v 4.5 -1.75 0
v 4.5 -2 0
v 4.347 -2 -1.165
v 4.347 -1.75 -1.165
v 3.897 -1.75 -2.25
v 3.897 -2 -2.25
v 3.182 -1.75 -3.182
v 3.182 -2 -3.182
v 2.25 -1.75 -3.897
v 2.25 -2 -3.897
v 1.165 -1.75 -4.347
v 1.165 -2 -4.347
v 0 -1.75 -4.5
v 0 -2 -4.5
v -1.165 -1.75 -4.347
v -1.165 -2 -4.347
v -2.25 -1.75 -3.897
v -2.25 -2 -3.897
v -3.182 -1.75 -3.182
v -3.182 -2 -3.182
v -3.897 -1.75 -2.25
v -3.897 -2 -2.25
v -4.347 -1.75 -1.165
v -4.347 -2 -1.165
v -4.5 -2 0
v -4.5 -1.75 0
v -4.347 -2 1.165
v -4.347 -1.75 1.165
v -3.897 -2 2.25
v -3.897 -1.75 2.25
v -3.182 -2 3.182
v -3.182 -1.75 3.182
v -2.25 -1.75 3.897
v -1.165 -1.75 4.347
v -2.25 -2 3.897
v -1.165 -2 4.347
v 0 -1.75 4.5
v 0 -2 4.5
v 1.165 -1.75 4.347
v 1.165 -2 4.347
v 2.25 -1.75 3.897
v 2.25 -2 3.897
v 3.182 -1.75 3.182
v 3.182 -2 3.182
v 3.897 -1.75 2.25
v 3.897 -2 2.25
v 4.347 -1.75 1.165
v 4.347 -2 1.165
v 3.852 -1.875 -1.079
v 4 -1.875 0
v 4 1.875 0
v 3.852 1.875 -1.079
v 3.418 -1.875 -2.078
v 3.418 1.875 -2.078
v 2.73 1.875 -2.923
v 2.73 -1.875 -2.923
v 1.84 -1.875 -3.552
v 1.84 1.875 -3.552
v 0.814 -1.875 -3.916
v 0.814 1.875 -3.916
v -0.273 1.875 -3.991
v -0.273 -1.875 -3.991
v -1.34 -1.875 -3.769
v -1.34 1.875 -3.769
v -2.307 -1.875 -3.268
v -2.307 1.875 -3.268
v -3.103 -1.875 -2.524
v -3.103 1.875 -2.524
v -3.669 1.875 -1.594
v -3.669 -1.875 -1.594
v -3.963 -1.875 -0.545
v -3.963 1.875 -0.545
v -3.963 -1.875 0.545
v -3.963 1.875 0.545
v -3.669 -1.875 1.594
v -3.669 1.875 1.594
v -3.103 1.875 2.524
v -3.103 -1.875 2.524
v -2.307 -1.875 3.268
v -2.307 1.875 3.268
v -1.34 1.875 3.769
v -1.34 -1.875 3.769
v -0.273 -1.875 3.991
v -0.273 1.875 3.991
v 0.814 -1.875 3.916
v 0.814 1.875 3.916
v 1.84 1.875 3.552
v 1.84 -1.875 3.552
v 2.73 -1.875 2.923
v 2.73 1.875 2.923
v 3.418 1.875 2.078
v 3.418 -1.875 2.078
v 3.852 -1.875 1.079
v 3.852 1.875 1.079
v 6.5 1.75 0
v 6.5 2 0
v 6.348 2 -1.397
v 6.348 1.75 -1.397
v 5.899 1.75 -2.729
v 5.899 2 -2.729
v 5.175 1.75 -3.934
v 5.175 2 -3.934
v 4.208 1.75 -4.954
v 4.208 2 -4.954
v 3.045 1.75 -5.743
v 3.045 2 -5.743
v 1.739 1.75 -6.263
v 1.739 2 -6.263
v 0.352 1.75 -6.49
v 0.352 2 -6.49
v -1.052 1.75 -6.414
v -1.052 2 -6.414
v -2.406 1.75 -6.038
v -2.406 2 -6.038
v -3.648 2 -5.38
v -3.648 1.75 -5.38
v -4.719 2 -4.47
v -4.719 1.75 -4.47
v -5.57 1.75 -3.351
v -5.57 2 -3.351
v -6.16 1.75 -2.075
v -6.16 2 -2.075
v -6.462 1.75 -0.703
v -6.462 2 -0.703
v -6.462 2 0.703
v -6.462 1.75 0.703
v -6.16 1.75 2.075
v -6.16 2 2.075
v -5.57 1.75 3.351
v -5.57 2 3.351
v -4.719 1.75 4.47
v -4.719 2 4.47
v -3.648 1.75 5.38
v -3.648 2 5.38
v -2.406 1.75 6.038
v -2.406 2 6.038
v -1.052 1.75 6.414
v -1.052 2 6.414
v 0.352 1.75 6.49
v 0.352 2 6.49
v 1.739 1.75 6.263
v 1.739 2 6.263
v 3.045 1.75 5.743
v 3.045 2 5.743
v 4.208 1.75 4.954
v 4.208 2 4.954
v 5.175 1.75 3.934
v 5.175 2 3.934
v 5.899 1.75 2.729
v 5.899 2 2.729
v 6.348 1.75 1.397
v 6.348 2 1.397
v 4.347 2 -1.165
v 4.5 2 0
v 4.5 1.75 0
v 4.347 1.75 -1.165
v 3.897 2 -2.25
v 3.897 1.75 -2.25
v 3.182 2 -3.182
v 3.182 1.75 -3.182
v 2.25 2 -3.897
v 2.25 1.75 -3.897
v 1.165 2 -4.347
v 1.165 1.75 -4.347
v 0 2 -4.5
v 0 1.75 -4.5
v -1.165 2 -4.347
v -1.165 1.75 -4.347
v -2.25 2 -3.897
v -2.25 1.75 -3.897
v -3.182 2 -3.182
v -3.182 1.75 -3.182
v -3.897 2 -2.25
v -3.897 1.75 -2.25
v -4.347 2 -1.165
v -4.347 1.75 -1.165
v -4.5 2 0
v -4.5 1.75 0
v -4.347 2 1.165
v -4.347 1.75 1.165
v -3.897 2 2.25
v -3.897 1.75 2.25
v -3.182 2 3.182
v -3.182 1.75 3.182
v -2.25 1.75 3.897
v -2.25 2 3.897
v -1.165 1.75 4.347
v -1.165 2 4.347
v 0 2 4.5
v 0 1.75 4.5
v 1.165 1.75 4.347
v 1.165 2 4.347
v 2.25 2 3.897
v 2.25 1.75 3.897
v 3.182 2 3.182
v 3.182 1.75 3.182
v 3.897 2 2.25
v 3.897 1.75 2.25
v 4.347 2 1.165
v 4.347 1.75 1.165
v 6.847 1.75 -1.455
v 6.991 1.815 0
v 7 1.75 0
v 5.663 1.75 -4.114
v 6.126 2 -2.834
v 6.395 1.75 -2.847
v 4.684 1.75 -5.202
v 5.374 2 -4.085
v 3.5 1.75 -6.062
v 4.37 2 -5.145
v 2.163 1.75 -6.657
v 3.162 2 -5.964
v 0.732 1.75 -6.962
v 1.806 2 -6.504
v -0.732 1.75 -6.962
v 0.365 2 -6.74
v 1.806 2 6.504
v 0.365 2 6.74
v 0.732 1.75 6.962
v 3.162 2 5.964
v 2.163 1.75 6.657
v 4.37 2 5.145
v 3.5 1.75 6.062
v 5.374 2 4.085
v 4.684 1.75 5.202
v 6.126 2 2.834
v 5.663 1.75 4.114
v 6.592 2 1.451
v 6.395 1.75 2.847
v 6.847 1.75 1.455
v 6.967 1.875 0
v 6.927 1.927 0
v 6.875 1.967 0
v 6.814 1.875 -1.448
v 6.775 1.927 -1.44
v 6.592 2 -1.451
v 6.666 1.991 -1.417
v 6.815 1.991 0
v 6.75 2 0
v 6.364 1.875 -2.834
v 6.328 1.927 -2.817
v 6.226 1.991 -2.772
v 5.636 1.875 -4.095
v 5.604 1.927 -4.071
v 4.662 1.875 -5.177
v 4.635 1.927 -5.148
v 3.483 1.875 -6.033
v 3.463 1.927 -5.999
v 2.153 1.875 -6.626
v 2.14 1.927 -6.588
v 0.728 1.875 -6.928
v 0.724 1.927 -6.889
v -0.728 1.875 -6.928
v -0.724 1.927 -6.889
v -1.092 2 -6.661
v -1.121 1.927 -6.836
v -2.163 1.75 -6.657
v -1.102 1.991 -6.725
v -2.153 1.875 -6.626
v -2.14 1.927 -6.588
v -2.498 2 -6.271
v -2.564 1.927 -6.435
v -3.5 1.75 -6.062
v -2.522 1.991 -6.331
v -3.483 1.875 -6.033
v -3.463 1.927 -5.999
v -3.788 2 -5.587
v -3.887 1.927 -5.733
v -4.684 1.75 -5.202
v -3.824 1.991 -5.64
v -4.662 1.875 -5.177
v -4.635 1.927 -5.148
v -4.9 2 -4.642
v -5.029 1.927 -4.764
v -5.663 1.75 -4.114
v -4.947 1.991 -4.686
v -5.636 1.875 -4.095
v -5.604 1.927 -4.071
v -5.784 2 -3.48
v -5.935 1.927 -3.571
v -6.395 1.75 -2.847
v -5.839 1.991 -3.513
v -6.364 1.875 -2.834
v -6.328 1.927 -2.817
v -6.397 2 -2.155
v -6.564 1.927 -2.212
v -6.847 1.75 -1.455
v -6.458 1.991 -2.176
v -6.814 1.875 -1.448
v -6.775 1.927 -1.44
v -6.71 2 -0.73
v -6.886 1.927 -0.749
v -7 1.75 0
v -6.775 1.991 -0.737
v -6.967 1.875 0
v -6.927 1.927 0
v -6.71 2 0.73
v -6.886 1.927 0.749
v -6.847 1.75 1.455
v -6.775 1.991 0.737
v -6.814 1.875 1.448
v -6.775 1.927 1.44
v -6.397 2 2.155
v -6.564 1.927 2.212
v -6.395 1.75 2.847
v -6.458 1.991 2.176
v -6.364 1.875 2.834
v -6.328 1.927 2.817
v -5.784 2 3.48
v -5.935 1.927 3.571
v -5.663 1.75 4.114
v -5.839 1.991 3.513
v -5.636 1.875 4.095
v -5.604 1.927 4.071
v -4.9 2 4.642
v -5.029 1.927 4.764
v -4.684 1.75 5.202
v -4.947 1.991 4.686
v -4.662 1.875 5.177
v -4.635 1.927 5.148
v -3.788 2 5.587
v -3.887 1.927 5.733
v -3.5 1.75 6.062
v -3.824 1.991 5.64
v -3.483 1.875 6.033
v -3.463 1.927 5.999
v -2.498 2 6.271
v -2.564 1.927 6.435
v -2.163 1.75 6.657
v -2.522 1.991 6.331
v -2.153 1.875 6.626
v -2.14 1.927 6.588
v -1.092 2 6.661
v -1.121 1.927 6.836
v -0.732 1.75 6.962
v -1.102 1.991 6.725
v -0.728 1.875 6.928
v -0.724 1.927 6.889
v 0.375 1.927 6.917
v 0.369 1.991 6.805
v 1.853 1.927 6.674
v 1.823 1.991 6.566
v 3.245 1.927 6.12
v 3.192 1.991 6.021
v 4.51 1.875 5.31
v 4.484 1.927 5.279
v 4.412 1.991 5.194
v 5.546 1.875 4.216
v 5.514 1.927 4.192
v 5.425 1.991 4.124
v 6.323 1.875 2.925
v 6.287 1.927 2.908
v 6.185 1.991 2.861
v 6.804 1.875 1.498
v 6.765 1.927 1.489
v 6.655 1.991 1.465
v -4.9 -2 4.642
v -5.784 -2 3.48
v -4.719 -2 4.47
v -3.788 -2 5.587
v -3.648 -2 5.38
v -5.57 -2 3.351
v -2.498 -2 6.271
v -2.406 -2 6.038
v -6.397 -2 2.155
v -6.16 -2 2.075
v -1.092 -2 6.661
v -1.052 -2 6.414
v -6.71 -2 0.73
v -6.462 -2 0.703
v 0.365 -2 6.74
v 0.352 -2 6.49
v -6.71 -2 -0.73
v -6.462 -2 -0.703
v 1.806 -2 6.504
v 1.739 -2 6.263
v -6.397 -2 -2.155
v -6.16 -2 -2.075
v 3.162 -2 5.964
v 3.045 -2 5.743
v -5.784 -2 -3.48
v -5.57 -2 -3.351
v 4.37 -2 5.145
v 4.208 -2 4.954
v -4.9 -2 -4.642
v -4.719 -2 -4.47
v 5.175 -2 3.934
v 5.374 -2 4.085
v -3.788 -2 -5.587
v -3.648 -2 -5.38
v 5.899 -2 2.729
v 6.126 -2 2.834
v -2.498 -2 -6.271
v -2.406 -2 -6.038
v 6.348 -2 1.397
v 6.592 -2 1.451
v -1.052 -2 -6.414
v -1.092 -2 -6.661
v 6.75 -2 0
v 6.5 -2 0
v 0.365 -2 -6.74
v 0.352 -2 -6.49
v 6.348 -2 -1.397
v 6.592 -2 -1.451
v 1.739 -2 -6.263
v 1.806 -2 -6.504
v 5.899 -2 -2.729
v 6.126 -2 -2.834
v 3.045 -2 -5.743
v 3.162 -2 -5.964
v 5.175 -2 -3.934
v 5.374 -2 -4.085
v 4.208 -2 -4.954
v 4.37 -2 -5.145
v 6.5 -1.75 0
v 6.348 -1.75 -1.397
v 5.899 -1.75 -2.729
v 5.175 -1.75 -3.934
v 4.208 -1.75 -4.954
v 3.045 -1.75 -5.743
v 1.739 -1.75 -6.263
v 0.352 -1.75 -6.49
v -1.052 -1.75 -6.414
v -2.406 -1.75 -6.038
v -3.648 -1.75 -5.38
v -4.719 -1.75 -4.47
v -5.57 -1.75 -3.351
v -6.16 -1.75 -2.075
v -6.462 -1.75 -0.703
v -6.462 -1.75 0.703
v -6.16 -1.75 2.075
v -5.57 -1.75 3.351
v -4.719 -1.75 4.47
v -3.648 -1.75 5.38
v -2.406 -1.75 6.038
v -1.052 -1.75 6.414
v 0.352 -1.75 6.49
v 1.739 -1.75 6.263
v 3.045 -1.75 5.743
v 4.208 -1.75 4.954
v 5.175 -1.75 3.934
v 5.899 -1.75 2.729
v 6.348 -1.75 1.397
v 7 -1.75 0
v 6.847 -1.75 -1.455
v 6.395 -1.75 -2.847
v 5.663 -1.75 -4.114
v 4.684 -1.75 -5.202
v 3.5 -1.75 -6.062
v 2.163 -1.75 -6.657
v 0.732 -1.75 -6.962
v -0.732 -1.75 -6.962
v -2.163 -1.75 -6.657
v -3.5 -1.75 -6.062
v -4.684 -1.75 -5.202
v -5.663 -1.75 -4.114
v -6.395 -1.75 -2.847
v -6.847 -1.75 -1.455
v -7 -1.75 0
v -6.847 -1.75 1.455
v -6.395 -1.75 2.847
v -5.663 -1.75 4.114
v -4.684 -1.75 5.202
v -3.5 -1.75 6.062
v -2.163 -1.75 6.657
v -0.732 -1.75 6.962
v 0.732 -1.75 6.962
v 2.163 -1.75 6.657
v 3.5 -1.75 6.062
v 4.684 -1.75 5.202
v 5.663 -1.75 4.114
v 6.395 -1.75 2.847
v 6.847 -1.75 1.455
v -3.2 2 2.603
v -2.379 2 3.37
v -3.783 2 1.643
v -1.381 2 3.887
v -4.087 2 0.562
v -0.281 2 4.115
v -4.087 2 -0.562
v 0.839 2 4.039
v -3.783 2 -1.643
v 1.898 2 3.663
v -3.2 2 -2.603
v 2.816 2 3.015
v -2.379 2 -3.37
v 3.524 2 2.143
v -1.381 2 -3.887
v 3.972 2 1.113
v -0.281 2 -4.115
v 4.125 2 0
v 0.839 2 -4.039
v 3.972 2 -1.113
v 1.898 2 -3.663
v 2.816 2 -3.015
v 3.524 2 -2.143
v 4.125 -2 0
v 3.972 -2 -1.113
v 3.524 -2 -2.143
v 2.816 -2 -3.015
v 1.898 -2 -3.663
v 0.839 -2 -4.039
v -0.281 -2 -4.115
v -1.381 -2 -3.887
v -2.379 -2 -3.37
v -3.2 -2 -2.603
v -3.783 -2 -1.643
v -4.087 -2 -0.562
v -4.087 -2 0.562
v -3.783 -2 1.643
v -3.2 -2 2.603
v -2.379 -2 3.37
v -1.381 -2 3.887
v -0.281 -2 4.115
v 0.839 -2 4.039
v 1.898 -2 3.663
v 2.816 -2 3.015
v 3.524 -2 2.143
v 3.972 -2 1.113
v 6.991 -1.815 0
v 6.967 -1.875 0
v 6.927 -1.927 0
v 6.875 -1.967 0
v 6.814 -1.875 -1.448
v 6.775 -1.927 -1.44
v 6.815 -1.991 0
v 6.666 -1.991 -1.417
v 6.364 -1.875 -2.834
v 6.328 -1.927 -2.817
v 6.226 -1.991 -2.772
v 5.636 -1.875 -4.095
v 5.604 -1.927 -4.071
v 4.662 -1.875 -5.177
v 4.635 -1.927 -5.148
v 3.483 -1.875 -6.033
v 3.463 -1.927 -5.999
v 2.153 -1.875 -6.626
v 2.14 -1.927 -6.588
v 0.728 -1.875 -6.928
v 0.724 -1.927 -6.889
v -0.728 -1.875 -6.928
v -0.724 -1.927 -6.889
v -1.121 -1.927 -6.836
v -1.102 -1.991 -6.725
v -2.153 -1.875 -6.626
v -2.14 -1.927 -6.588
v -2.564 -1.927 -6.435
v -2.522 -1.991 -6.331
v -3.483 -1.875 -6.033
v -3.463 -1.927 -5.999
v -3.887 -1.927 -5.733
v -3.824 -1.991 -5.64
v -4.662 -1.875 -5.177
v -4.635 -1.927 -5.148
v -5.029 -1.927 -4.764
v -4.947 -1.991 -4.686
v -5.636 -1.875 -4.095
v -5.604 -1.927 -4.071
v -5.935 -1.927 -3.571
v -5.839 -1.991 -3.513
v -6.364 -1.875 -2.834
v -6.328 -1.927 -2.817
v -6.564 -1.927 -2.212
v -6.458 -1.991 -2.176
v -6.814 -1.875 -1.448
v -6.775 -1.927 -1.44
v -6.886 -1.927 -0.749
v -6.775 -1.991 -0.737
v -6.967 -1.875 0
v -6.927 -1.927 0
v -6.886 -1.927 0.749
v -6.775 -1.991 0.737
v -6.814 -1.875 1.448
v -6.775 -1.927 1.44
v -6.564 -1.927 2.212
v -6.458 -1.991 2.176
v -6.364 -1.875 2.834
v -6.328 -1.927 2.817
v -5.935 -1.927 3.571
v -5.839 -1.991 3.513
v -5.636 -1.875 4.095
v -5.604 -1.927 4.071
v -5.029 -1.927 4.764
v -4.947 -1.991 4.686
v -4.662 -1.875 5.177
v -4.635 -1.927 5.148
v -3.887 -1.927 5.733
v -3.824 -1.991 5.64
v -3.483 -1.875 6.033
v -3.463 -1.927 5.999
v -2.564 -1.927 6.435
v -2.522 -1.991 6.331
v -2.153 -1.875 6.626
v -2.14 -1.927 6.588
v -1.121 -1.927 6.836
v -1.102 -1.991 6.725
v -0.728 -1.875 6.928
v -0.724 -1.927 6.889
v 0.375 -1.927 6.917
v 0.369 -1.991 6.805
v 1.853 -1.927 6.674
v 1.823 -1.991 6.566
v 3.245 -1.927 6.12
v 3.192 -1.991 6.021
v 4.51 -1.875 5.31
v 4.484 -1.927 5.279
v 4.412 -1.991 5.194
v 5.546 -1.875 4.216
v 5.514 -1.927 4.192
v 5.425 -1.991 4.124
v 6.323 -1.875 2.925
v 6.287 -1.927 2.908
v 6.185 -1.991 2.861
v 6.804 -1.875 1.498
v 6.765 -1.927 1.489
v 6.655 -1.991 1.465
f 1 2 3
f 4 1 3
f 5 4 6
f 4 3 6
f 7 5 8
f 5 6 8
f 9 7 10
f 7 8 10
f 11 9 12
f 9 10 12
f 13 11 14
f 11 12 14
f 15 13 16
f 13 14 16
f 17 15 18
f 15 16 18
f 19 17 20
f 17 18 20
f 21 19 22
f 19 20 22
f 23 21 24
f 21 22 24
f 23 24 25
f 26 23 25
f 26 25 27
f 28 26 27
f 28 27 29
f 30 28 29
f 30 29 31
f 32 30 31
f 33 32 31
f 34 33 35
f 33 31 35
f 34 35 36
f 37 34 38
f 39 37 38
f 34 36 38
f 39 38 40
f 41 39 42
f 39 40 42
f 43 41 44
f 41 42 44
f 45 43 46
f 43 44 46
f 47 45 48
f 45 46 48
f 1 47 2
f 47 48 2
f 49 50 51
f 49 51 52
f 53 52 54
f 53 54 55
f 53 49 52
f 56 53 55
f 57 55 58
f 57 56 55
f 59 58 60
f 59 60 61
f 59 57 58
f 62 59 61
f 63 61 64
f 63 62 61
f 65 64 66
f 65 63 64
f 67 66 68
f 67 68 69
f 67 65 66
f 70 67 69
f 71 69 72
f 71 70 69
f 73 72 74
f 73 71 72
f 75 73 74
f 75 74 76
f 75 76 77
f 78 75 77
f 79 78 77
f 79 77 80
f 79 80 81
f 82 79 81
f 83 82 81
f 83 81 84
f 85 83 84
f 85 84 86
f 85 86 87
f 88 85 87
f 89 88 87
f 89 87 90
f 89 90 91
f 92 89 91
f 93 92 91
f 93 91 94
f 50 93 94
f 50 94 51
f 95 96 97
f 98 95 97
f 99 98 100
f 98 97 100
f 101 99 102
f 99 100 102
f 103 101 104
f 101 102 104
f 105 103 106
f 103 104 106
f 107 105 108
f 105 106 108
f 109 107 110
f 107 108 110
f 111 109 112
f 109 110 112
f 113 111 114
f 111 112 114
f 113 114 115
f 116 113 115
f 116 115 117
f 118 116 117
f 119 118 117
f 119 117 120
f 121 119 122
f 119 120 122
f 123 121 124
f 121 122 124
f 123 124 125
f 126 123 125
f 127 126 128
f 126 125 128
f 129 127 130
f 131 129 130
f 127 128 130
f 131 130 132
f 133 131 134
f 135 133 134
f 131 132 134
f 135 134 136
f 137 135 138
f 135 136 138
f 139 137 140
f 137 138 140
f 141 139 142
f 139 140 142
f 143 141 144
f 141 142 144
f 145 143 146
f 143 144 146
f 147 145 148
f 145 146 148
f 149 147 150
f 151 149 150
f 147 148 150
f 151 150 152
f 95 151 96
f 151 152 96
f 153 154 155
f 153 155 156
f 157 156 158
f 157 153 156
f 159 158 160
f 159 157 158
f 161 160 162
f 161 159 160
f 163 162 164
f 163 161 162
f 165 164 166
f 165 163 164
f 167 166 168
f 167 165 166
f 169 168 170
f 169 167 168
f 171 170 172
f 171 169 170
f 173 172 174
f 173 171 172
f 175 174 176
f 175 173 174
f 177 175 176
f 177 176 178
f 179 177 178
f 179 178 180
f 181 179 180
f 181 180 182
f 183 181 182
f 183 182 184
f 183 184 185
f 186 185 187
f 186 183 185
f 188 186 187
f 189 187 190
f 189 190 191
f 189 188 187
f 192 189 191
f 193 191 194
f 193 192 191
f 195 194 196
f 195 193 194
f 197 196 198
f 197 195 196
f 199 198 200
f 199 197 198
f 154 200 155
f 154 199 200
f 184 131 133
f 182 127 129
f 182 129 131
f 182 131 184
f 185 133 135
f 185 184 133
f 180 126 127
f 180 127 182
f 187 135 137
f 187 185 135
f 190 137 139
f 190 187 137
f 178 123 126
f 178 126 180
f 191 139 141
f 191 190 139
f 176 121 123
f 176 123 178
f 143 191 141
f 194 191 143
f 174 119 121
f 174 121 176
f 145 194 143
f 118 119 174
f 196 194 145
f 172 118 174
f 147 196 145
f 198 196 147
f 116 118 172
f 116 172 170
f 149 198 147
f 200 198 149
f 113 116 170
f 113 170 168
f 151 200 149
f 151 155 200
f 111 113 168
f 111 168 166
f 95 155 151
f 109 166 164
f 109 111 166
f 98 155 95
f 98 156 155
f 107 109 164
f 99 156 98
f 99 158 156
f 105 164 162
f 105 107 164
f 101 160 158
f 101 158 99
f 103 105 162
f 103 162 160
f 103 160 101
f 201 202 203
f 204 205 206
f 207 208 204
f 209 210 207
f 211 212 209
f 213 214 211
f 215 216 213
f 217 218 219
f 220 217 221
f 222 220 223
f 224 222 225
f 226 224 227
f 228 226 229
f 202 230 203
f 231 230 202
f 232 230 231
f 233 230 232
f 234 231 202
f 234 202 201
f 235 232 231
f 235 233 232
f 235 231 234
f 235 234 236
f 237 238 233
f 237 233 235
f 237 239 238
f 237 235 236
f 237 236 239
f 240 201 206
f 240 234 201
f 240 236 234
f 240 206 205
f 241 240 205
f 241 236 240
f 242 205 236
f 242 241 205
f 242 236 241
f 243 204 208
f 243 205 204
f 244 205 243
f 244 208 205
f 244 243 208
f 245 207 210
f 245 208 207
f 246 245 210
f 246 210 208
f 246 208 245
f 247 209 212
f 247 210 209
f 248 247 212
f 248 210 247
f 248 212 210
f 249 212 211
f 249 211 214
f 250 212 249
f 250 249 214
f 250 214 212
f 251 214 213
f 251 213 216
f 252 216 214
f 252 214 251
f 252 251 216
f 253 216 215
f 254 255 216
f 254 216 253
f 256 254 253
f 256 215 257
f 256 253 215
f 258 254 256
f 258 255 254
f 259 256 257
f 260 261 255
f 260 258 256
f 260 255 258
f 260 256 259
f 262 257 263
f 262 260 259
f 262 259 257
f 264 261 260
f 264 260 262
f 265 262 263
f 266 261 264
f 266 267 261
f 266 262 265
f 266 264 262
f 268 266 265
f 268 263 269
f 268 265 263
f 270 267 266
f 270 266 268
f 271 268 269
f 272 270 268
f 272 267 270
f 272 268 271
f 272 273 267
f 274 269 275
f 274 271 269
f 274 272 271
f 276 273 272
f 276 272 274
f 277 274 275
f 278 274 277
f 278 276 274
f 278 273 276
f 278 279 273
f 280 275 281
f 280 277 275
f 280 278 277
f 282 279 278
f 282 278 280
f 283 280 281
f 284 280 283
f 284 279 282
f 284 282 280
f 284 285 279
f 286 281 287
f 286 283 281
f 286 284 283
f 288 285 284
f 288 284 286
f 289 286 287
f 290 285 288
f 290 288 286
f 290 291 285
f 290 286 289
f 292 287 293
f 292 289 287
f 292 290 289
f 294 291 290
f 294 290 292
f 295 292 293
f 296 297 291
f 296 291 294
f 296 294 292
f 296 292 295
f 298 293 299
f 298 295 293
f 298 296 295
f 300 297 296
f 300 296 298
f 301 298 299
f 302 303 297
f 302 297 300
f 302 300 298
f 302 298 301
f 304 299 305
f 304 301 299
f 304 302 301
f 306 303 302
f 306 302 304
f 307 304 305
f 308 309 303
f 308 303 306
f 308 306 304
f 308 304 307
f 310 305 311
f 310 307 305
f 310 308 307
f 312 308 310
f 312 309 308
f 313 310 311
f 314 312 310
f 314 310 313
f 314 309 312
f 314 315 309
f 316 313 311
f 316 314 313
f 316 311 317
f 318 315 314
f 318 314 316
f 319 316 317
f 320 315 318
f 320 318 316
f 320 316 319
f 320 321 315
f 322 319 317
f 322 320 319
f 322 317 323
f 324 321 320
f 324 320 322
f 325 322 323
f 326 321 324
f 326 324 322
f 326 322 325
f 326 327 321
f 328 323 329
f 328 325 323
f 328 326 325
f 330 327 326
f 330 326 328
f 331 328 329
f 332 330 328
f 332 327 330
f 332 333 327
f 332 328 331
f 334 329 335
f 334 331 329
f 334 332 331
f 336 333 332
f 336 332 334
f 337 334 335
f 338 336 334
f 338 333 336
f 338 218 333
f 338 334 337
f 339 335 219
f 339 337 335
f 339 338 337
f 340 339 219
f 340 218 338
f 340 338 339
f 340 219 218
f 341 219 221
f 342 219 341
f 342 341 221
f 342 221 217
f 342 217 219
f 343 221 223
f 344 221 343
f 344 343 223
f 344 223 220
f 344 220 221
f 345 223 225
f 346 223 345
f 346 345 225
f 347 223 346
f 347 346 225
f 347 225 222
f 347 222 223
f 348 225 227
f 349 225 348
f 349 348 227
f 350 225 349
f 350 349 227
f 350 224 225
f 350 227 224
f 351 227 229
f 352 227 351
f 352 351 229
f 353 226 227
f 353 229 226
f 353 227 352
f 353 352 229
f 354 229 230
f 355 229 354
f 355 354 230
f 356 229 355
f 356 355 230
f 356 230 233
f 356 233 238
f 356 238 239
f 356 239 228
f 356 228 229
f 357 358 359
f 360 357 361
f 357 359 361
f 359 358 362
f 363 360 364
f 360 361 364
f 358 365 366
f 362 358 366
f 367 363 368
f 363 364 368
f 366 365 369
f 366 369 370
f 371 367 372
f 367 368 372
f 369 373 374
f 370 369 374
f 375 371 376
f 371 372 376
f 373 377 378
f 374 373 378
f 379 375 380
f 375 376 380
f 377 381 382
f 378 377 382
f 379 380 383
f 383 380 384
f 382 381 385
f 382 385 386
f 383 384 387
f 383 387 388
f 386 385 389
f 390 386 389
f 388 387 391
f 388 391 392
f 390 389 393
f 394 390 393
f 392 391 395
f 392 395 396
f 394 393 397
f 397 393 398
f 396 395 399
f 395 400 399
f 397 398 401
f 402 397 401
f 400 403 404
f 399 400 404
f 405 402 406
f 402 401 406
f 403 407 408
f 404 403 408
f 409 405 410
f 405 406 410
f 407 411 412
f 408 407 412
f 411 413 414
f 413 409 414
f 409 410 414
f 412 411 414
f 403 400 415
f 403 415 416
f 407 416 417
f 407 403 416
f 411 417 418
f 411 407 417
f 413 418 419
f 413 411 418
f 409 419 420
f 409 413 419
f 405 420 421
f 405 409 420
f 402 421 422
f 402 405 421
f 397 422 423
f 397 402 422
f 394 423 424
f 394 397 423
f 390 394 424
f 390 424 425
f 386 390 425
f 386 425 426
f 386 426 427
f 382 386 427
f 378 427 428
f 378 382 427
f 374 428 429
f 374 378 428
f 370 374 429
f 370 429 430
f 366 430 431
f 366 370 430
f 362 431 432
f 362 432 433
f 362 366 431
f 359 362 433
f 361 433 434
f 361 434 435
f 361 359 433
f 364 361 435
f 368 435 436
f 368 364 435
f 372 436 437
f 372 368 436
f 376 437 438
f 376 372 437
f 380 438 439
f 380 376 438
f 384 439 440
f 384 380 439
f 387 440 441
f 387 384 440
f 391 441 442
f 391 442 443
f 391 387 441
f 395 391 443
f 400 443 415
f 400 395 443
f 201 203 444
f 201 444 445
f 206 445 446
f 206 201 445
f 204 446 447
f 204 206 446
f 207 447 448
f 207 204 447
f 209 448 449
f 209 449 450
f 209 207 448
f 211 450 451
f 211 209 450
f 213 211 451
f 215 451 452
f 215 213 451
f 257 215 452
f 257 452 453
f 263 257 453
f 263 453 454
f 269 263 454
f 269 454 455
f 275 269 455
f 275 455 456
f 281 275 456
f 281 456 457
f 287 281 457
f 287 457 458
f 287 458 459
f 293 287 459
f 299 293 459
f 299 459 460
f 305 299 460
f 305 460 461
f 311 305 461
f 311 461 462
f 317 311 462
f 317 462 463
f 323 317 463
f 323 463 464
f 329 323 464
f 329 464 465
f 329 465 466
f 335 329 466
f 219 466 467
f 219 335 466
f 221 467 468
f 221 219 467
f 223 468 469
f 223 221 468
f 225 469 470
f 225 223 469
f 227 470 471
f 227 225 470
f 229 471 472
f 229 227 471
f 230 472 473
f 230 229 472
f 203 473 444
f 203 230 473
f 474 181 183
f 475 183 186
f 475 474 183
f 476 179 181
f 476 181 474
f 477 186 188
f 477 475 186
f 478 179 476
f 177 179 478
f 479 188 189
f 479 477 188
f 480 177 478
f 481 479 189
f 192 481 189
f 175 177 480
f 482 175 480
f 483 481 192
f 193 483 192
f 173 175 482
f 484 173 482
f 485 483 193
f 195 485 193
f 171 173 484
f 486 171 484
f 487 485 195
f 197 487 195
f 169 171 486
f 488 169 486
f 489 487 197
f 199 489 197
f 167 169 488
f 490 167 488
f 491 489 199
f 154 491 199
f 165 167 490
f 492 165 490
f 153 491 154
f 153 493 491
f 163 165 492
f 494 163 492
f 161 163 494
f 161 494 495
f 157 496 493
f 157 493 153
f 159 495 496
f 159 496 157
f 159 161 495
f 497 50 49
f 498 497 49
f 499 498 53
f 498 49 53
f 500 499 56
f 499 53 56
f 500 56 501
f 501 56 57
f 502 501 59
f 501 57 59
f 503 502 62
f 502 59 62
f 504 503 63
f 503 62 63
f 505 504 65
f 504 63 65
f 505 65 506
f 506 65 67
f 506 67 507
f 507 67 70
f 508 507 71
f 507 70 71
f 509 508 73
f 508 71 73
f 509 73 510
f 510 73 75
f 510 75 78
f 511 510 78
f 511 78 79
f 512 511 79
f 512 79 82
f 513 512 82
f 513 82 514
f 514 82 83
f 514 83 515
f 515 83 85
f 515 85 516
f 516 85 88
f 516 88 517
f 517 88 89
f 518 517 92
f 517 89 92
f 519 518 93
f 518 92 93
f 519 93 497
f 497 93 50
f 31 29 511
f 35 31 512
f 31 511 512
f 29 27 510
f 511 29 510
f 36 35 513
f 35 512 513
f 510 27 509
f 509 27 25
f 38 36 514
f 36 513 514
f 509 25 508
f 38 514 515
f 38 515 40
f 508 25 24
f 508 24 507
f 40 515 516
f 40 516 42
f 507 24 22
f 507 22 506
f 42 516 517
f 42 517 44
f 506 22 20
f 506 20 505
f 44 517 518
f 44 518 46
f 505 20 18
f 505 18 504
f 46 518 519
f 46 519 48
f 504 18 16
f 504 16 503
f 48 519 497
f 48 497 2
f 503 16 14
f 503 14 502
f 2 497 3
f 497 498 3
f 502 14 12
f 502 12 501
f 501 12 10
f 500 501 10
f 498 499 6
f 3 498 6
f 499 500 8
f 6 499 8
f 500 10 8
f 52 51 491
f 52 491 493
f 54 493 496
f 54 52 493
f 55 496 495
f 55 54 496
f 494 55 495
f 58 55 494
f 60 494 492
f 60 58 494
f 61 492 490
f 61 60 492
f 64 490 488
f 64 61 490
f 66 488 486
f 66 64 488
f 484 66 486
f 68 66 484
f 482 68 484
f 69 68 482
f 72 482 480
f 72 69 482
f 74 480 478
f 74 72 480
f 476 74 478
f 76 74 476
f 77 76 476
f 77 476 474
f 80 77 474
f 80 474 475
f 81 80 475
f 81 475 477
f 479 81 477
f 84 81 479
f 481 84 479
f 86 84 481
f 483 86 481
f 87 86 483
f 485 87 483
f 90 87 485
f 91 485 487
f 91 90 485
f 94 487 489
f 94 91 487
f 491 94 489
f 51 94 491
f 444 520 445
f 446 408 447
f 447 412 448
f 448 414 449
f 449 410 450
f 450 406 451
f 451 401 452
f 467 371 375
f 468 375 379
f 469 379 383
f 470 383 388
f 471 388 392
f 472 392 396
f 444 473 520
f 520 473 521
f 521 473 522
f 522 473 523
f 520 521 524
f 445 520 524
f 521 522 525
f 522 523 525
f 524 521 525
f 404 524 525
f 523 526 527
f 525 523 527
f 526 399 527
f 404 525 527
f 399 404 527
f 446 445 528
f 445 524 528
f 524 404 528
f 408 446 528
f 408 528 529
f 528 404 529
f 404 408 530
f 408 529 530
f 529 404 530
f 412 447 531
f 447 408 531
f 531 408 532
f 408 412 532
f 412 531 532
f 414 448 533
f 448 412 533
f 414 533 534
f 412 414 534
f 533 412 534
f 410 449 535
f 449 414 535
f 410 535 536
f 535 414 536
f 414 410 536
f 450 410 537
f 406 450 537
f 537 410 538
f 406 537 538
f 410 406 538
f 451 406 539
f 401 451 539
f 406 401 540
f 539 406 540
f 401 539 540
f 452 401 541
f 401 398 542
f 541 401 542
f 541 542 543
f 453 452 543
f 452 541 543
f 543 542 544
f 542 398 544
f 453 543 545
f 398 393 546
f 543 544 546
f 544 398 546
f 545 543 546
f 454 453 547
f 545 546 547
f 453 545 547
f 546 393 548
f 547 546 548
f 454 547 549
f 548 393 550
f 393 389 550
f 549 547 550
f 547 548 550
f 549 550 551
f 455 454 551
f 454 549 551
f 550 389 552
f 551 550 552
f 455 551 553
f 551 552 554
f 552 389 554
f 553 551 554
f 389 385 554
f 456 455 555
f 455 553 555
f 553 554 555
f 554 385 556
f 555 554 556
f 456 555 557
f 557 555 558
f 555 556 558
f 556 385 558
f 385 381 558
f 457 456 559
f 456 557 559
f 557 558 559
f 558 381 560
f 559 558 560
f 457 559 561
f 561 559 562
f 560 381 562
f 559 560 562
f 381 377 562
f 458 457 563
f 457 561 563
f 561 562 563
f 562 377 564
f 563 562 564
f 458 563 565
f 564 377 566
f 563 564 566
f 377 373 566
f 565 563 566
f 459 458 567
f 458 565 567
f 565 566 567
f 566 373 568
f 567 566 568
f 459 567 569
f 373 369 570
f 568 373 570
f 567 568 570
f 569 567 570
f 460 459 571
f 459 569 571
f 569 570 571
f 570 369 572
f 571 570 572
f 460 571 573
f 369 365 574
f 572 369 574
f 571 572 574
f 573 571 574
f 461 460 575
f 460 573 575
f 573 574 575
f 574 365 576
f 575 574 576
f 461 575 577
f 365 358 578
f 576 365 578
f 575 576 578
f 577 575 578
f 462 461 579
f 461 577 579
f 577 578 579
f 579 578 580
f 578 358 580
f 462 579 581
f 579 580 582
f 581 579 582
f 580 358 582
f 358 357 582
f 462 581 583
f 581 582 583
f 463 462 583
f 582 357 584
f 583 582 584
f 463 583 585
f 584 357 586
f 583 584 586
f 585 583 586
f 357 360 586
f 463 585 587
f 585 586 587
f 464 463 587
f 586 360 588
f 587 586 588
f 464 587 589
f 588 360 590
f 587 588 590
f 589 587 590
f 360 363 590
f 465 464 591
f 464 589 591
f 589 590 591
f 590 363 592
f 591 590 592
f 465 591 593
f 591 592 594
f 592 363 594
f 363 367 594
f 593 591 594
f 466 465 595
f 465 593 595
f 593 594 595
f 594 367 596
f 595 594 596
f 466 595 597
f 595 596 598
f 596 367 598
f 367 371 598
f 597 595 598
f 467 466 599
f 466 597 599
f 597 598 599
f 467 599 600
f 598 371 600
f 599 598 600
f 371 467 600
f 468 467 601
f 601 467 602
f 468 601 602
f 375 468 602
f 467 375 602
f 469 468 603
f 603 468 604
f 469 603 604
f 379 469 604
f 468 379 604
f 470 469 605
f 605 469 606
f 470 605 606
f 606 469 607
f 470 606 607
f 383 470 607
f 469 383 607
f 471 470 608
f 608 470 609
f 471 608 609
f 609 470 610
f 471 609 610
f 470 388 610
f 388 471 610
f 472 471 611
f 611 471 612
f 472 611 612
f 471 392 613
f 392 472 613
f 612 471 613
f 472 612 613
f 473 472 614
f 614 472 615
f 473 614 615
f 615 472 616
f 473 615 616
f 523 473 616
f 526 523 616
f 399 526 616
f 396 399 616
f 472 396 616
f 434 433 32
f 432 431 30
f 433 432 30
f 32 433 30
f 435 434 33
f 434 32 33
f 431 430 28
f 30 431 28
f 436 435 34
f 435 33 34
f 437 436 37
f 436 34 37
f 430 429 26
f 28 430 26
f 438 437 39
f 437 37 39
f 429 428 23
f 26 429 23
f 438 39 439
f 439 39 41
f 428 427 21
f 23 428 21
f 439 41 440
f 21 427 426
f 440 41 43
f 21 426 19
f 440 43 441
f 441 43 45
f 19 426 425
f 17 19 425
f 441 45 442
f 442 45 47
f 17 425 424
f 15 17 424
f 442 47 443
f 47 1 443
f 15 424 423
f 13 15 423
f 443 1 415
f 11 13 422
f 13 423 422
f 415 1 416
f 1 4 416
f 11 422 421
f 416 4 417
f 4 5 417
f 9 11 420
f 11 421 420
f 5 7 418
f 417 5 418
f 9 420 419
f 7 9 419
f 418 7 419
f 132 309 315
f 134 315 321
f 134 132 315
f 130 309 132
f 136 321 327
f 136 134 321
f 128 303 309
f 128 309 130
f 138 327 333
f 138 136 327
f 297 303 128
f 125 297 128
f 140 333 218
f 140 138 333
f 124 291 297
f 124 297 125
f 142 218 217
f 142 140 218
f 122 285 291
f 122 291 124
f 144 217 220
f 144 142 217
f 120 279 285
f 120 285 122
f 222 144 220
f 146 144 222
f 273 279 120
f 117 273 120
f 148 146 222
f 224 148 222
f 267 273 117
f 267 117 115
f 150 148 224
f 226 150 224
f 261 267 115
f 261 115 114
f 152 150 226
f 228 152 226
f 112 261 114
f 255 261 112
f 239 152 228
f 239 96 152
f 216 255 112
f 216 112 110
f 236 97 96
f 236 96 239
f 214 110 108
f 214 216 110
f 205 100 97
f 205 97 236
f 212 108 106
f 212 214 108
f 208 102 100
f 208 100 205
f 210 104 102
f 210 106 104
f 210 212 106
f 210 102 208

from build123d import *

# Parameters (mm, degrees)
SKETCH2_R           = 7
SKETCH2_R_2         = 4
BOSS_EXTRUDE1_DEPTH = 2
SKETCH3_R           = 6.5
SKETCH3_R_2         = 4.5
CUT_EXTRUDE1_DEPTH  = 0.25
FILLET1_R           = 0.25
CHAMFER1_SIZE       = 0.125


with BuildPart() as part:
    # Sketch2 → Boss-Extrude1 (new body, symmetric)
    with BuildSketch(Plane(origin=(0, 0, 0), x_dir=(1, 0, 0), z_dir=(0, 1, 0))):
        Circle(SKETCH2_R)
        Circle(SKETCH2_R_2, mode=Mode.SUBTRACT)
    extrude(amount=BOSS_EXTRUDE1_DEPTH, both=True)

    # Sketch3 → Cut-Extrude1 (cut)
    with BuildSketch(Plane(origin=(0, 2, 0), x_dir=(1, 0, 0), z_dir=(0, 1, 0))):
        Circle(SKETCH3_R)
        Circle(SKETCH3_R_2, mode=Mode.SUBTRACT)
    cut_extrude1 = extrude(amount=-CUT_EXTRUDE1_DEPTH, mode=Mode.SUBTRACT)

    # Mirror1: Cut-Extrude1 across plane
    add(cut_extrude1.mirror(Plane.ZX), mode=Mode.SUBTRACT)

    # Fillet1
    fillet1_edges = [part.edges().sort_by_distance(p)[0] for p in [
        (-7, -2, 0),
        (-7, 2, 0),
    ]]
    fillet(fillet1_edges, radius=FILLET1_R)

    # Chamfer1
    chamfer1_edges = [part.edges().sort_by_distance(p)[0] for p in [
        (-4, -2, 0),
        (-4, 2, 0),
    ]]
    chamfer(chamfer1_edges, length=CHAMFER1_SIZE)


solid = part.part
